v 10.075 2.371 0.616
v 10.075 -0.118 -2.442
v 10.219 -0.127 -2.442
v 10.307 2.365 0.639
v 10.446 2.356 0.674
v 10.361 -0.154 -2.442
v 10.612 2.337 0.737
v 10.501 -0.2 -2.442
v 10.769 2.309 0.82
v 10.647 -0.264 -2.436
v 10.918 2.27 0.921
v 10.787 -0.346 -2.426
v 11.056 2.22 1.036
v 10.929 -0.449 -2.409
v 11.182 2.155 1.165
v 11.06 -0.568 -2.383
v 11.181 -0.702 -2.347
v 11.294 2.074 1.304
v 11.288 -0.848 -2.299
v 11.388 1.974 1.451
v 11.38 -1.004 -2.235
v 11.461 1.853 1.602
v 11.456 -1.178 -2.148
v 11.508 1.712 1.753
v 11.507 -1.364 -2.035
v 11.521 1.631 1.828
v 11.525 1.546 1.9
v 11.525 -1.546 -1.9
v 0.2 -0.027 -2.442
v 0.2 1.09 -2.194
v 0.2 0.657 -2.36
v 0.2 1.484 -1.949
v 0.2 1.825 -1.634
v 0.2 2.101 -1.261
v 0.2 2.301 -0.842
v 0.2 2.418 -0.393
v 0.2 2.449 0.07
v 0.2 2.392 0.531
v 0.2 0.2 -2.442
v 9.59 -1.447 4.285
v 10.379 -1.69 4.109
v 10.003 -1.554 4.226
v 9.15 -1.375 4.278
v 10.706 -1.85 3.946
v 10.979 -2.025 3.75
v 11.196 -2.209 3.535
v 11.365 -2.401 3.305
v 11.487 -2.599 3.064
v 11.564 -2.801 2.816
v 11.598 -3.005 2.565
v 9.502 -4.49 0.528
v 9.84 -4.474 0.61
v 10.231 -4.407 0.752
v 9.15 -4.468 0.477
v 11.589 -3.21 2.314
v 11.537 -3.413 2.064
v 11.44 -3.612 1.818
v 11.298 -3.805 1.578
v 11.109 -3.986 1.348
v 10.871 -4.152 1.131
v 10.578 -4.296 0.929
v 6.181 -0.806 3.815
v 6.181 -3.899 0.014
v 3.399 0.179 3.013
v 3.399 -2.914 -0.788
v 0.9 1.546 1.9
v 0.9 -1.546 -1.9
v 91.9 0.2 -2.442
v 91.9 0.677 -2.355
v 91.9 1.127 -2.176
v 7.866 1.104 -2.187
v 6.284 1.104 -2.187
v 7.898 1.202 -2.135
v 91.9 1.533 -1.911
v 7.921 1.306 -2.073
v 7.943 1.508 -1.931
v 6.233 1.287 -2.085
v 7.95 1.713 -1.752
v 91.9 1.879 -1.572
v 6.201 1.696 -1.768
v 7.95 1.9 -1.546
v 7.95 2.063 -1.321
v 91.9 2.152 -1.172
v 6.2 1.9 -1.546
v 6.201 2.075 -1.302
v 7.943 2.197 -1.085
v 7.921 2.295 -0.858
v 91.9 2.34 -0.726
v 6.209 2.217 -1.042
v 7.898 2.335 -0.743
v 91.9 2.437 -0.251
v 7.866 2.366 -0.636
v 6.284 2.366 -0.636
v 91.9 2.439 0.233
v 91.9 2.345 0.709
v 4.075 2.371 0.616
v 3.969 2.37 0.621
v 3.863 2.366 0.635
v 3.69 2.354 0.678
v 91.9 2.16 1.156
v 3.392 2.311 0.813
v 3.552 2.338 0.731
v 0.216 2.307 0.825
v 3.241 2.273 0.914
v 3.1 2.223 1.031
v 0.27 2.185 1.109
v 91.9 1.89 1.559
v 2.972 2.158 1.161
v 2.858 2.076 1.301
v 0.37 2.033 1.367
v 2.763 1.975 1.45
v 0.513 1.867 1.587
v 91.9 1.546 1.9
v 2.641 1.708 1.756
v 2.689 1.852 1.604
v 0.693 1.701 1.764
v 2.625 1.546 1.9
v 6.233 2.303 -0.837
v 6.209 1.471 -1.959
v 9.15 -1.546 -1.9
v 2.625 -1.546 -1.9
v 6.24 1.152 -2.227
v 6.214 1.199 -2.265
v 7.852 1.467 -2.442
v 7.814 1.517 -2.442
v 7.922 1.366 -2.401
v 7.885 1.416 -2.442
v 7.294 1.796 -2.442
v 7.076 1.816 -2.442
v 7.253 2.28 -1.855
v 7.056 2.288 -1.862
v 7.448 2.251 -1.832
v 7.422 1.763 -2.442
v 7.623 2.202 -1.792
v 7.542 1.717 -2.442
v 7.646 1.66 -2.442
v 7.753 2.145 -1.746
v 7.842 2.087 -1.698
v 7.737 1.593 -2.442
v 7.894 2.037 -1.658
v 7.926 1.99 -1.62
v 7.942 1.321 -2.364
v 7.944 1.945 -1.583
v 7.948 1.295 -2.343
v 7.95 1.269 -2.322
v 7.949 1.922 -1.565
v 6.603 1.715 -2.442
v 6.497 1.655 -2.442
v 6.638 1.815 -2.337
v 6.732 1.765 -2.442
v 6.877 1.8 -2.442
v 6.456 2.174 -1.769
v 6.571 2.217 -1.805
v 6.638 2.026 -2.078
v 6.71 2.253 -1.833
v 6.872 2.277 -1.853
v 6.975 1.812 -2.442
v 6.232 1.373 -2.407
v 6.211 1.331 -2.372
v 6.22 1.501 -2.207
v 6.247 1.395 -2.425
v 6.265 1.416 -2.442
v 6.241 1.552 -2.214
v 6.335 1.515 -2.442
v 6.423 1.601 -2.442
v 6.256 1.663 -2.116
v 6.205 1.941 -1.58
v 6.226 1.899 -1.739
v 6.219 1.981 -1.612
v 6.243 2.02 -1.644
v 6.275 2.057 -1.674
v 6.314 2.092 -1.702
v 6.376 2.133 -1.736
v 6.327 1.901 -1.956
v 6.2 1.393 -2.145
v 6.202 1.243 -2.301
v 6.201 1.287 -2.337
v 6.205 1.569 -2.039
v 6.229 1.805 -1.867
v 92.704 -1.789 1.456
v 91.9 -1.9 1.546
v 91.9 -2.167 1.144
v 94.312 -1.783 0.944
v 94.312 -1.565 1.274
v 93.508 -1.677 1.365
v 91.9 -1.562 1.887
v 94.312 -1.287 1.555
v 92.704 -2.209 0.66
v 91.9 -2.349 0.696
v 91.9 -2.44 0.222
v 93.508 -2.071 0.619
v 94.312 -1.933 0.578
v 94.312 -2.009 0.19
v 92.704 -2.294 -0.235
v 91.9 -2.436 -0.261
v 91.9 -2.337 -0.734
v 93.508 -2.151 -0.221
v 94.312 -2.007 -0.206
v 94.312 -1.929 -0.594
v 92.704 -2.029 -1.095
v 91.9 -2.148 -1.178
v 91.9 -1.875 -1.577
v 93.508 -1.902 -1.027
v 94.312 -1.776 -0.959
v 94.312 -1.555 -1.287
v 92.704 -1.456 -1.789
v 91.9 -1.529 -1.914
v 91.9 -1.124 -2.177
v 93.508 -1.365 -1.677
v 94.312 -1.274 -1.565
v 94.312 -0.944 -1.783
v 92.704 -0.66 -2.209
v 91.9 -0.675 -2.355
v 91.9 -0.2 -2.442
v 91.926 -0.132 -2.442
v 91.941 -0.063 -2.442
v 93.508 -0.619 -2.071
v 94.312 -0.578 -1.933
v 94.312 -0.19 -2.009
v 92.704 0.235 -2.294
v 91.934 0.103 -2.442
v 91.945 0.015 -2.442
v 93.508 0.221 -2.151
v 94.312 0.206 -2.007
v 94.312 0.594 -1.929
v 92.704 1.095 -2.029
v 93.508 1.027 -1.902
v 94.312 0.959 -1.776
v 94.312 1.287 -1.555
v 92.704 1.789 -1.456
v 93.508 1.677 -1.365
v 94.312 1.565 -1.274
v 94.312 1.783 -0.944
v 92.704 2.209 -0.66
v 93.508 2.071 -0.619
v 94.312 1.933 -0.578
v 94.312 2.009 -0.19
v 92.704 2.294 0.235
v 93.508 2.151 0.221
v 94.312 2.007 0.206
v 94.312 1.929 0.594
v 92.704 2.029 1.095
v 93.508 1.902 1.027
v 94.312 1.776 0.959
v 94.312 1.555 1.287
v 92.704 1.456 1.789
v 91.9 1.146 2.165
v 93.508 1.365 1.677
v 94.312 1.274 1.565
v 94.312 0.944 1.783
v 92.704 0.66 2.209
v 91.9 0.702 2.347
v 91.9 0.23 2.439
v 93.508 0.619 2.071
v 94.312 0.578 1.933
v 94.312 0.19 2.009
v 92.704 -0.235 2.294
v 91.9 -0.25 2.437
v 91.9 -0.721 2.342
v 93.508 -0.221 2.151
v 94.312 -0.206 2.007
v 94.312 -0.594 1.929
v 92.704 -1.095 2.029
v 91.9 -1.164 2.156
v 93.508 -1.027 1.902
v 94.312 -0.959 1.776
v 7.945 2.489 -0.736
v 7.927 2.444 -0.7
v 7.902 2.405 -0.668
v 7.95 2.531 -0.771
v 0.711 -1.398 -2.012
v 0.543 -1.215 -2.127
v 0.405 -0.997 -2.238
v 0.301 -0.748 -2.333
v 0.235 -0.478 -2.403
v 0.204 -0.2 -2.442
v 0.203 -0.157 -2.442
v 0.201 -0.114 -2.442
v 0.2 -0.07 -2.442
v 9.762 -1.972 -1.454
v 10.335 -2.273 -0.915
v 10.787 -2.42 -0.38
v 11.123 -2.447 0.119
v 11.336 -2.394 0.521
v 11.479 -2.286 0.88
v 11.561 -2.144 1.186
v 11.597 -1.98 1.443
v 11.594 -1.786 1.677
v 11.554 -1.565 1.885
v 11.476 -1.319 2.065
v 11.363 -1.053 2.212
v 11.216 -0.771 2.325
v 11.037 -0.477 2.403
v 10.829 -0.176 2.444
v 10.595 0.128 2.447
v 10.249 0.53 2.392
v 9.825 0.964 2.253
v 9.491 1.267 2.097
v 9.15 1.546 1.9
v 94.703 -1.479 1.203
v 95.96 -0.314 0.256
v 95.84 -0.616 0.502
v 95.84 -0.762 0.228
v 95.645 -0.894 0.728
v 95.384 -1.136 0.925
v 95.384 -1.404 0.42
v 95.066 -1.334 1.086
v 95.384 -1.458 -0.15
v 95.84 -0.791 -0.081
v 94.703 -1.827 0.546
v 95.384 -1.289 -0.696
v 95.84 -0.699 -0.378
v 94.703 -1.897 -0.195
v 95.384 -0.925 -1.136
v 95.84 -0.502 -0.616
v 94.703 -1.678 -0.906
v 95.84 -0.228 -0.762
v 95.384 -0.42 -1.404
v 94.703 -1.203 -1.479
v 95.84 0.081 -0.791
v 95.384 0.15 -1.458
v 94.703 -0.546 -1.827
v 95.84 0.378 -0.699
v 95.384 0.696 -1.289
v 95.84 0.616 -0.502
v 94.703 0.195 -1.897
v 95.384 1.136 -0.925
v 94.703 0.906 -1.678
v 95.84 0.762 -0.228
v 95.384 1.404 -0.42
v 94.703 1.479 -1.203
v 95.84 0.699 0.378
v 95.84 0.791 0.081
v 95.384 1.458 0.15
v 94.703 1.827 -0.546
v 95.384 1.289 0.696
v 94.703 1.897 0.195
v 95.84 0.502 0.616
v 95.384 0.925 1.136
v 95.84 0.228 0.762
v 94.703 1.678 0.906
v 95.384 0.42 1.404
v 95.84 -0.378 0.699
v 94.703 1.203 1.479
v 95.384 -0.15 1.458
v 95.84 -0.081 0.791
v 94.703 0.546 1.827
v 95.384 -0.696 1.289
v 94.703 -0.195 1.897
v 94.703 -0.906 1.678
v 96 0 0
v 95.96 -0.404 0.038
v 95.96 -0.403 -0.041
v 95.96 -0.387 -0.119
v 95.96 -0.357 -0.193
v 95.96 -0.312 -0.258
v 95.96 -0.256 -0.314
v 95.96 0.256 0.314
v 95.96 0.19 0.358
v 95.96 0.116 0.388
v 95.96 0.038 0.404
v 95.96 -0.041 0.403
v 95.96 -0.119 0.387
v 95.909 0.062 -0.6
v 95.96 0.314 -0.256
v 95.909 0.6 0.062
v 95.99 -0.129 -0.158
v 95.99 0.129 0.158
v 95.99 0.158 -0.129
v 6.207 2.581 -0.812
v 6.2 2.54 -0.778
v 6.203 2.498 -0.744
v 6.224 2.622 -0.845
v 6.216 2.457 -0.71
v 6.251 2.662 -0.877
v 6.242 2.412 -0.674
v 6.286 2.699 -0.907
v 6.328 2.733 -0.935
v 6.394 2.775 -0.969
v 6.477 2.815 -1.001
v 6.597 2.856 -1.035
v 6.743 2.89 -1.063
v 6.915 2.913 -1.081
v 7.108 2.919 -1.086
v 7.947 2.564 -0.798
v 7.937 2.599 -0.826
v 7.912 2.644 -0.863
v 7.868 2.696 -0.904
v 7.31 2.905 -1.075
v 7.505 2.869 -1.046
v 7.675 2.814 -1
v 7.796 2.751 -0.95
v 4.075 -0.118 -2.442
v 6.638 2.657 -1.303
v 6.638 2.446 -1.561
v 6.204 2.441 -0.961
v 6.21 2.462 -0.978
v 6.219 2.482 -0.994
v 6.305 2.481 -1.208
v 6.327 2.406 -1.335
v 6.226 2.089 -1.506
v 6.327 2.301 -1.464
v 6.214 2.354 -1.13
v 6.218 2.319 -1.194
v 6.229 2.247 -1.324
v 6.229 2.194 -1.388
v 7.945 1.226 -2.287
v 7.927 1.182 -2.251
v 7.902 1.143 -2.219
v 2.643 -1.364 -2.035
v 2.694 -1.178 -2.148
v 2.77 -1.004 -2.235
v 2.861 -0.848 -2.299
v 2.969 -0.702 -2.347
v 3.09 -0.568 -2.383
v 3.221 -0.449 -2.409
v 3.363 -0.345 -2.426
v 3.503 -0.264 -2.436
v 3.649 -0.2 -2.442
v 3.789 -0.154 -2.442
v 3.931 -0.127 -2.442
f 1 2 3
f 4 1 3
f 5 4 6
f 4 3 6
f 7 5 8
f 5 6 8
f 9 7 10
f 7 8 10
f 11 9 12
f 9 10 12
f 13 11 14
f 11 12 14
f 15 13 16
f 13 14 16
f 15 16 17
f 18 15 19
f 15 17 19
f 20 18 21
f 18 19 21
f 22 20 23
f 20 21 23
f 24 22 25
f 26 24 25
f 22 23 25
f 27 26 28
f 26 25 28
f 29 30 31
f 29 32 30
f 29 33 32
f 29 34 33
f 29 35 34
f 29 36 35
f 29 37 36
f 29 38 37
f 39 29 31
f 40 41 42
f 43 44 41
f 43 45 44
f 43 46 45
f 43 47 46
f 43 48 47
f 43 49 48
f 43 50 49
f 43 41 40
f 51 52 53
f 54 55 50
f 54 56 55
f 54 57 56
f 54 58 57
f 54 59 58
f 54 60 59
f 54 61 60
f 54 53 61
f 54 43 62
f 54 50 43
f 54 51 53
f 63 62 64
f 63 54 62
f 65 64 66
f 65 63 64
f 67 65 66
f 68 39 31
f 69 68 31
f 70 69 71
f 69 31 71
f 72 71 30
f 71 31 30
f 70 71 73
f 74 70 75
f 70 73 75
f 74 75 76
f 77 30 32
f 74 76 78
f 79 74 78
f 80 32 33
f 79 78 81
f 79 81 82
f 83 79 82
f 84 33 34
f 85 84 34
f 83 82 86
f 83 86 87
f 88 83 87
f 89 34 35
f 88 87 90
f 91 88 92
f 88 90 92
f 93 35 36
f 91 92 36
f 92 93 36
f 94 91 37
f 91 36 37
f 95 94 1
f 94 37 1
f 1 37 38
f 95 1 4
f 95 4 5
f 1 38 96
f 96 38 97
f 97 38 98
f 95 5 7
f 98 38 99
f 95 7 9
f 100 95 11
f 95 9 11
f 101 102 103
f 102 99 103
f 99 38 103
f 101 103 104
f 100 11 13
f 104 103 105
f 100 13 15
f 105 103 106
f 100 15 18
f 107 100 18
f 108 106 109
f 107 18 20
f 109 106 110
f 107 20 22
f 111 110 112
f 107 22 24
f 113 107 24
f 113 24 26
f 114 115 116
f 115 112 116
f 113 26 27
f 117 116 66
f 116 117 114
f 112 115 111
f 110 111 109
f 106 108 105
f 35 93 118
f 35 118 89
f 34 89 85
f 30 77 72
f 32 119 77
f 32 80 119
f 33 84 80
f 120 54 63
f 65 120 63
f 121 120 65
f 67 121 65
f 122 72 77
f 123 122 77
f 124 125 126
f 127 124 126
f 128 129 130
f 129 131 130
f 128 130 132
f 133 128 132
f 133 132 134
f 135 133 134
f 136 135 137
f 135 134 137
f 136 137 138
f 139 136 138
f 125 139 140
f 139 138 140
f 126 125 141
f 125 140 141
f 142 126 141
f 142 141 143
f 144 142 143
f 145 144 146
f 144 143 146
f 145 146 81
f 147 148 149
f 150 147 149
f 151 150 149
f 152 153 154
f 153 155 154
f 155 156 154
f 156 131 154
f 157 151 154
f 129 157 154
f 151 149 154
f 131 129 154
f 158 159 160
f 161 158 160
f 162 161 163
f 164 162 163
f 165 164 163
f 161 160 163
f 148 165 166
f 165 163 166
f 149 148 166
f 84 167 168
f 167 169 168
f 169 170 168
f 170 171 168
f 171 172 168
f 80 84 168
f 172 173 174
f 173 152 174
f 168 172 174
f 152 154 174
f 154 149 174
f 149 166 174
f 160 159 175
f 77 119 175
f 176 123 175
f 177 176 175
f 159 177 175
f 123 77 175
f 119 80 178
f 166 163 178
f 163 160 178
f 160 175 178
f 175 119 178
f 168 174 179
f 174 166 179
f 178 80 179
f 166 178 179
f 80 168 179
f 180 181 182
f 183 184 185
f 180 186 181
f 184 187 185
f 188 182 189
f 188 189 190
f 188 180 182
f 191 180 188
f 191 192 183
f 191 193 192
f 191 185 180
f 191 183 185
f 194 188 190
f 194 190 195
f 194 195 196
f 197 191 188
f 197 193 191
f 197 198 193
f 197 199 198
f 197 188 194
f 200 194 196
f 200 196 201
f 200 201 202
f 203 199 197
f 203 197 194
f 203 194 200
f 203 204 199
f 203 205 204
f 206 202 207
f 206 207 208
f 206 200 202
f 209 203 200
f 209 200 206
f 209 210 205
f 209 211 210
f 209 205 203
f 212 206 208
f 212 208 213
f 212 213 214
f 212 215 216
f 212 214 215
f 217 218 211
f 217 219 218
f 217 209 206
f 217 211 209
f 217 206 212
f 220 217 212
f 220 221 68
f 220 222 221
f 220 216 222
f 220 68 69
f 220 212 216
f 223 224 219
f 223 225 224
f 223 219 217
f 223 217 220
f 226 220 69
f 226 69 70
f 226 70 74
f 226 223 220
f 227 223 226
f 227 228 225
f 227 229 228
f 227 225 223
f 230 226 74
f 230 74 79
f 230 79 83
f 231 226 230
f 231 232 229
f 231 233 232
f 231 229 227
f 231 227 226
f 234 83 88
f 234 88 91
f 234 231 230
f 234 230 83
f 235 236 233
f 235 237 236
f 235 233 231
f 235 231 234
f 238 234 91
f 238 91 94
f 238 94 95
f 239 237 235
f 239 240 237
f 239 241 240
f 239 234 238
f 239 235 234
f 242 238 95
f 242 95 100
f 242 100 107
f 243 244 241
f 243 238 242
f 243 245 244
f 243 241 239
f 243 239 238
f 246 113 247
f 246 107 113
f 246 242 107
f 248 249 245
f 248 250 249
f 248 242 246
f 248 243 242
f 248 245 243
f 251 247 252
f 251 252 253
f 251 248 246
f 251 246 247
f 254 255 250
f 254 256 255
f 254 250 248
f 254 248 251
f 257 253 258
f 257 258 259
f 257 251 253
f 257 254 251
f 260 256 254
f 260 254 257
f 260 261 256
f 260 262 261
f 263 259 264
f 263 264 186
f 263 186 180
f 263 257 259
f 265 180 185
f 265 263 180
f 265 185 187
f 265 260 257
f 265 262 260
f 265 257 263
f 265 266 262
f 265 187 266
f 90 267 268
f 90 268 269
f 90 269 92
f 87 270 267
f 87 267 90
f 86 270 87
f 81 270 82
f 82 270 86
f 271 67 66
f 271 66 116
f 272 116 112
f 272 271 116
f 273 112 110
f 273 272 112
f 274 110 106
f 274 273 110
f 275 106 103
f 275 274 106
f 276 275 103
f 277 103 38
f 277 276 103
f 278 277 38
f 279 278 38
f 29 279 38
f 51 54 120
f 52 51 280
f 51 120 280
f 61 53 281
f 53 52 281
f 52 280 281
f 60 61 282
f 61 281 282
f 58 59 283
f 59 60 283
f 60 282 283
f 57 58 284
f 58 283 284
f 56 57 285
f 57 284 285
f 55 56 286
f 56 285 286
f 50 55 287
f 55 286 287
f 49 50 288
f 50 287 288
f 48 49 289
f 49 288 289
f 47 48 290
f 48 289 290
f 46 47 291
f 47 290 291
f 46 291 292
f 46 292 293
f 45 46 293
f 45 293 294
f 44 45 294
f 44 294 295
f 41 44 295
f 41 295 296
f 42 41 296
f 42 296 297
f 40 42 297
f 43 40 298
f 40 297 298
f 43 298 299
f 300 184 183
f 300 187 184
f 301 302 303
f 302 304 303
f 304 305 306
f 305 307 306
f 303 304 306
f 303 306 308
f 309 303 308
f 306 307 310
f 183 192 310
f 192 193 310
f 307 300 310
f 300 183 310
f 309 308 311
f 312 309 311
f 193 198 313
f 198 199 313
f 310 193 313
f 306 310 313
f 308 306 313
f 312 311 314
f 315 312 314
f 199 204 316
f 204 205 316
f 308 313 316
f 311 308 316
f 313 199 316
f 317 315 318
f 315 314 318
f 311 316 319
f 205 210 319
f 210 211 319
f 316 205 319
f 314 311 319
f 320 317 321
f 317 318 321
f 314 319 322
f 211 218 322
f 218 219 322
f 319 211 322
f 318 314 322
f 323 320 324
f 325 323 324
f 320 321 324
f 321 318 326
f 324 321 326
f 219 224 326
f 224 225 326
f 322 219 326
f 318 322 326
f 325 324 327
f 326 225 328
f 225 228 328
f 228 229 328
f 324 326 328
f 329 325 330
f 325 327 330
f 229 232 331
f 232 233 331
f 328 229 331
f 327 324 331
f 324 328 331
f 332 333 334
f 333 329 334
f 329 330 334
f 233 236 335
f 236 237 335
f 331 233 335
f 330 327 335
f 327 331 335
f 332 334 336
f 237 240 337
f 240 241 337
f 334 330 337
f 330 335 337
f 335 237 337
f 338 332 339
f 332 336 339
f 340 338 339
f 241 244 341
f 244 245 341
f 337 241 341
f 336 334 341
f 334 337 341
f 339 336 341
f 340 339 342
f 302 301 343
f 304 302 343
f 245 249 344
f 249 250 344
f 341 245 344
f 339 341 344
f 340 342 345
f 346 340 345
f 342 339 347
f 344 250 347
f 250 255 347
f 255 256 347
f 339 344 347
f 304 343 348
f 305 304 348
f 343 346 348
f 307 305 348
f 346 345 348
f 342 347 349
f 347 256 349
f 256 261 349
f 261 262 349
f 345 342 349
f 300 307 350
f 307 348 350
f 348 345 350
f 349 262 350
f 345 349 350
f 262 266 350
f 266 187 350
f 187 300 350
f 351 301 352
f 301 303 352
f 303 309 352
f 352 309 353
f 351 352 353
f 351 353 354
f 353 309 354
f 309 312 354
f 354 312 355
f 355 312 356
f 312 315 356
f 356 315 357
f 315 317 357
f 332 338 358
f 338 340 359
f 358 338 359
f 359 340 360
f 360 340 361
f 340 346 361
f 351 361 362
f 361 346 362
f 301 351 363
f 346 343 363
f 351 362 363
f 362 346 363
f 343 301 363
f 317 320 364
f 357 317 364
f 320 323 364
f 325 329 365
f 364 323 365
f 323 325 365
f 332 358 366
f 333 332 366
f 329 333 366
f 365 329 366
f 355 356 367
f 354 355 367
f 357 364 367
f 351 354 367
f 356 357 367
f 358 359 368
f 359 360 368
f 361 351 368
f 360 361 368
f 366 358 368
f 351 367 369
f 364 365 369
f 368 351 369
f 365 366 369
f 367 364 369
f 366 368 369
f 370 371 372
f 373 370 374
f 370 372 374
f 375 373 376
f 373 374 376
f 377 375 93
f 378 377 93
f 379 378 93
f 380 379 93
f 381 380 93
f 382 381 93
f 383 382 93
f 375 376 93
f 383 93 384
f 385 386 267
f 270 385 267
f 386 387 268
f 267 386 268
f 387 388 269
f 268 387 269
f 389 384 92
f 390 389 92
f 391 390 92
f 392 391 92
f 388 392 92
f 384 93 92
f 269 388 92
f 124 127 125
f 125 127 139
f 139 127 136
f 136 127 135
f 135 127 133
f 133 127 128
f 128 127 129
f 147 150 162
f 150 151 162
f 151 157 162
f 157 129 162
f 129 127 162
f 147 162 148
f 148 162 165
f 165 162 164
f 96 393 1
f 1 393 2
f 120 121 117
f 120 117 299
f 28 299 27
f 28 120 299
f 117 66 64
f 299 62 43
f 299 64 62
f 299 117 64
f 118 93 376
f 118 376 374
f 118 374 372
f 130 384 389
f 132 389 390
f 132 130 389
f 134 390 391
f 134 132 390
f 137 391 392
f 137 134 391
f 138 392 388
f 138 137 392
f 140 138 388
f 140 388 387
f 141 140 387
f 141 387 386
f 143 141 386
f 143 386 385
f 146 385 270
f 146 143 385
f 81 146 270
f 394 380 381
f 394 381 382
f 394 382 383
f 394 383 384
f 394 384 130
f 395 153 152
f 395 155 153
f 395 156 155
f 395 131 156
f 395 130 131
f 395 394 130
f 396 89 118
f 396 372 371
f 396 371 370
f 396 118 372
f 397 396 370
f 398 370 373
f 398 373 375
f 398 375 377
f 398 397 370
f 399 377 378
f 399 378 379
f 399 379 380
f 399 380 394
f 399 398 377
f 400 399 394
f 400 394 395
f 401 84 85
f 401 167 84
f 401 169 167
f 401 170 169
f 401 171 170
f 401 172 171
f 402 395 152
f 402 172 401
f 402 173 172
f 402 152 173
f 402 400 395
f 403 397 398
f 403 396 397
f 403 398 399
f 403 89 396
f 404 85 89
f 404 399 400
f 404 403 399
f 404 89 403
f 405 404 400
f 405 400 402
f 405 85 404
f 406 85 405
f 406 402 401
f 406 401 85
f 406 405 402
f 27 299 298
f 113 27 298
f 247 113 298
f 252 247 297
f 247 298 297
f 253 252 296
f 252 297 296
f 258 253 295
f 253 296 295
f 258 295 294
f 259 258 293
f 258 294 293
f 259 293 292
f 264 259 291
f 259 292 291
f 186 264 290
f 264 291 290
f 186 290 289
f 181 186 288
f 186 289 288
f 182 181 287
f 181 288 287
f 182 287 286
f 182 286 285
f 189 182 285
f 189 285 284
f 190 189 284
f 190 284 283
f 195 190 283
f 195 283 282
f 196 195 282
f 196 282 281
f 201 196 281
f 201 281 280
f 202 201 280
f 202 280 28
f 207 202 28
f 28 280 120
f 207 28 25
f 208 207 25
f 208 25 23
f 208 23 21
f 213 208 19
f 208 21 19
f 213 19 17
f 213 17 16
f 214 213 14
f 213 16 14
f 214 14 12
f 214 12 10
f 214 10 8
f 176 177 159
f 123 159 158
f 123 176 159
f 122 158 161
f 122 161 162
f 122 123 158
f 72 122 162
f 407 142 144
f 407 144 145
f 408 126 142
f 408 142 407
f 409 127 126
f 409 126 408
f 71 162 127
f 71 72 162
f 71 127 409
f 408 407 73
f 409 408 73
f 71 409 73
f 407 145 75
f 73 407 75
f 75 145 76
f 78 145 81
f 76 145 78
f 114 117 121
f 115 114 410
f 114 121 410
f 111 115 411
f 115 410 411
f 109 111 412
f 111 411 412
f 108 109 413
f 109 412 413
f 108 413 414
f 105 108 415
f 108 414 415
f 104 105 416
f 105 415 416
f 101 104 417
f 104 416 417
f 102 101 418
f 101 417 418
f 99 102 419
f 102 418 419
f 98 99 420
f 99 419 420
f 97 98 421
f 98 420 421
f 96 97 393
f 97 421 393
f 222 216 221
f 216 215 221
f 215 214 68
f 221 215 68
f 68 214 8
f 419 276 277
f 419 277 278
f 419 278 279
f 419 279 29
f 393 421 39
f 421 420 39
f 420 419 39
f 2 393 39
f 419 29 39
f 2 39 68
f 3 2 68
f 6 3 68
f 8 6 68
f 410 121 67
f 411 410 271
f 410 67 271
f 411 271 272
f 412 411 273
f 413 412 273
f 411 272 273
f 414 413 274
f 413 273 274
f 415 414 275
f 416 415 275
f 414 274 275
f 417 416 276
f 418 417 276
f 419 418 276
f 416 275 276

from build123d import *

# Parameters (mm, degrees)
SKETCH_R             = 2.45
PAD_DEPTH            = 96
PAD001_DEPTH         = 3.95
POCKET_DEPTH         = 5
PAD002_DEPTH         = 1
PAD002_DEPTH_BACK    = 1
POCKET001_DEPTH      = 10
POCKET002_DEPTH      = 100
POCKET002_DEPTH_BACK = -100
BODY_PLACEMENT_ANGLE = 50.86


with BuildPart() as part:
    # Sketch → Pad (new body)
    with BuildSketch(Plane.YZ):
        Circle(SKETCH_R)
    extrude(amount=PAD_DEPTH)

    # Sketch001 → Pad001 (join)
    with BuildSketch(Plane.XY):
        with BuildLine():
            Line((0, -2.45), (0, 2.45))
            Line((0, 2.45), (9.15, 2.45))
            ThreePointArc((9.15, -2.45), (11.6, 0), (9.15, 2.45))
            Line((9.15, -2.45), (0, -2.45))
        make_face()
    extrude(amount=PAD001_DEPTH)

    # Sketch002 (on Face4 of Pad001) → Pocket (cut)
    with BuildSketch(Plane(origin=(0, -2.45, 0), x_dir=(0, 0, -1), z_dir=(0, -1, 0))):
        with BuildLine():
            Line((-3.95, 11.6), (-3.95, -0.8))
            Line((-3.95, -0.8), (2.45, -0.8))
            Line((2.45, -0.8), (2.45, 0.2))
            Line((1.520231, 0.2), (2.45, 0.2))
            ThreePointArc((0, 0.900424), (0.683318, 0.383526), (1.520231, 0.2))
            ThreePointArc((-3.95, 11.6), (-2.930968, 5.897294), (0, 0.900424))
        make_face()
    extrude(amount=-POCKET_DEPTH, mode=Mode.SUBTRACT)

    # Sketch003 → Pad002 (join, two sides)
    with BuildSketch(Plane.XZ) as pad002_sk:
        with BuildLine():
            add(Edge.make_bspline(
                [(7.95, -2.45), (7.95, -1.583975), (6.6375, -2.016987), (5.325, -2.45), (6.6375, -2.883013), (7.95, -3.316025), (7.95, -2.45)],
                knots=[0, 0, 0, 2.094395, 2.094395, 4.18879, 4.18879, 6.283185, 6.283185, 6.283185], degree=2, weights=[1, 0.5, 1, 0.5, 1, 0.5, 1]))
        make_face()
    extrude(amount=PAD002_DEPTH)
    extrude(pad002_sk.sketch, amount=-PAD002_DEPTH_BACK)

    # Sketch004 (on Face2 of Pad002) → Pocket001 (cut)
    with BuildSketch(Plane(origin=(0, -2.45, 0), x_dir=(0, 0, -1), z_dir=(0, -1, 0))):
        with BuildLine():
            Line((1.45, 4.075), (1.45, 10.075))
            ThreePointArc((1.45, 10.075), (1.025305, 11.100305), (0, 11.525))
            Line((0, 2.625), (0, 11.525))
            ThreePointArc((0, 2.625), (1.025305, 3.049695), (1.45, 4.075))
        make_face()
    extrude(amount=-POCKET001_DEPTH, mode=Mode.SUBTRACT)

    # Sketch005 → Groove (revolve, cut)
    with BuildSketch(Plane.XZ):
        with BuildLine():
            Line((96, 2.45), (91.9, 2.45))
            Line((91.9, 2.45), (94.311588, 2.017859))
            ThreePointArc((96, 0), (95.52222, 1.315531), (94.311588, 2.017859))
            Line((96, 0), (97, 0))
            Line((97, 2.45), (97, 0))
            Line((96, 2.45), (97, 2.45))
        make_face()
    revolve(axis=Axis((0, 0, 0), (1, 0, 0)), mode=Mode.SUBTRACT)

    # Sketch006 → Pocket002 (cut, two sides)
    with BuildSketch(Plane.YZ) as pocket002_sk:
        Polygon((-2.020175, -1.386144), (-0.747522, -2.95), (-2.020175, -2.95), align=None)
    extrude(amount=-POCKET002_DEPTH, mode=Mode.SUBTRACT)
    extrude(pocket002_sk.sketch, amount=-POCKET002_DEPTH_BACK, mode=Mode.SUBTRACT)


with BuildPart() as part_1:
    # Body placement: moved
    add(part.part.rotate(Axis((0, 0, 0), (1, 0, 0)), BODY_PLACEMENT_ANGLE))


solid = part_1.part
